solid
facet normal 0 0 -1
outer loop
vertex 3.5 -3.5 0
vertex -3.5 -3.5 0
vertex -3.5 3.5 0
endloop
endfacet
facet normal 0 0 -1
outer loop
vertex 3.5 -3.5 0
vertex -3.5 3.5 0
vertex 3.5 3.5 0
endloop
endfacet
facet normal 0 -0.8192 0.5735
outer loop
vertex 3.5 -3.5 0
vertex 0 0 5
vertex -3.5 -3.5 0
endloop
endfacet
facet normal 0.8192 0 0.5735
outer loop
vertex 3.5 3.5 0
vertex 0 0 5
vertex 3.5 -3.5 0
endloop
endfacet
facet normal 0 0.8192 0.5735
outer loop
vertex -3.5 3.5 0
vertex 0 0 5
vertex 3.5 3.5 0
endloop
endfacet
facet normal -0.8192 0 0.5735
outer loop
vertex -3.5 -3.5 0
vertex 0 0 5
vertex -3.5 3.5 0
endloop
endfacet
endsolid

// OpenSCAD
//Example made by M2MakerLab 


/* [Parameters group (aka "Tab")] */

//Variable Description (Optional)
//Variable_name = default value //Variable value options 

//Textbox
cube_name = "example cube";

//Spinbox
Square_side_lenght = 5;
//Square_side_lenght = 5; // 0.5 

//Slider (default step size 1)
cube_height = 5; //[1:30]

//Slider custom step size (0.05)
cube_top_scale = 0; // [0:0.05:4]

//Combo box for string
cube_color = "green"; //[red, blue, cyan, purple, orange, gray]

//Labeled combo box for numbers
cube_twist = 0; //[0:No twist, 20:Light twist, 60:Medium twist, 150:Heavy twist, 350:Extreme twist]

//Checkbox
Add_hole = false;


//Mesh resolution
$fn = 100;

//Here object code starts and parameters declaration ends 
color(cube_color)
linear_extrude(height= cube_height, 
               twist = cube_twist, 
               scale = cube_top_scale)
     if (Add_hole) //if add_hole is checked, add hole
       {
        difference(){
            square ([Square_side_lenght*1.4, Square_side_lenght*1.4], center = true);
    square([Square_side_lenght, Square_side_lenght],center = true);}
       }else{  //add_hole not checked
           square ([Square_side_lenght*1.4, Square_side_lenght*1.4], center = true);}
                


//For other parameters types/options see here: https://en.wikibooks.org/wiki/OpenSCAD_User_Manual/Customizer 
